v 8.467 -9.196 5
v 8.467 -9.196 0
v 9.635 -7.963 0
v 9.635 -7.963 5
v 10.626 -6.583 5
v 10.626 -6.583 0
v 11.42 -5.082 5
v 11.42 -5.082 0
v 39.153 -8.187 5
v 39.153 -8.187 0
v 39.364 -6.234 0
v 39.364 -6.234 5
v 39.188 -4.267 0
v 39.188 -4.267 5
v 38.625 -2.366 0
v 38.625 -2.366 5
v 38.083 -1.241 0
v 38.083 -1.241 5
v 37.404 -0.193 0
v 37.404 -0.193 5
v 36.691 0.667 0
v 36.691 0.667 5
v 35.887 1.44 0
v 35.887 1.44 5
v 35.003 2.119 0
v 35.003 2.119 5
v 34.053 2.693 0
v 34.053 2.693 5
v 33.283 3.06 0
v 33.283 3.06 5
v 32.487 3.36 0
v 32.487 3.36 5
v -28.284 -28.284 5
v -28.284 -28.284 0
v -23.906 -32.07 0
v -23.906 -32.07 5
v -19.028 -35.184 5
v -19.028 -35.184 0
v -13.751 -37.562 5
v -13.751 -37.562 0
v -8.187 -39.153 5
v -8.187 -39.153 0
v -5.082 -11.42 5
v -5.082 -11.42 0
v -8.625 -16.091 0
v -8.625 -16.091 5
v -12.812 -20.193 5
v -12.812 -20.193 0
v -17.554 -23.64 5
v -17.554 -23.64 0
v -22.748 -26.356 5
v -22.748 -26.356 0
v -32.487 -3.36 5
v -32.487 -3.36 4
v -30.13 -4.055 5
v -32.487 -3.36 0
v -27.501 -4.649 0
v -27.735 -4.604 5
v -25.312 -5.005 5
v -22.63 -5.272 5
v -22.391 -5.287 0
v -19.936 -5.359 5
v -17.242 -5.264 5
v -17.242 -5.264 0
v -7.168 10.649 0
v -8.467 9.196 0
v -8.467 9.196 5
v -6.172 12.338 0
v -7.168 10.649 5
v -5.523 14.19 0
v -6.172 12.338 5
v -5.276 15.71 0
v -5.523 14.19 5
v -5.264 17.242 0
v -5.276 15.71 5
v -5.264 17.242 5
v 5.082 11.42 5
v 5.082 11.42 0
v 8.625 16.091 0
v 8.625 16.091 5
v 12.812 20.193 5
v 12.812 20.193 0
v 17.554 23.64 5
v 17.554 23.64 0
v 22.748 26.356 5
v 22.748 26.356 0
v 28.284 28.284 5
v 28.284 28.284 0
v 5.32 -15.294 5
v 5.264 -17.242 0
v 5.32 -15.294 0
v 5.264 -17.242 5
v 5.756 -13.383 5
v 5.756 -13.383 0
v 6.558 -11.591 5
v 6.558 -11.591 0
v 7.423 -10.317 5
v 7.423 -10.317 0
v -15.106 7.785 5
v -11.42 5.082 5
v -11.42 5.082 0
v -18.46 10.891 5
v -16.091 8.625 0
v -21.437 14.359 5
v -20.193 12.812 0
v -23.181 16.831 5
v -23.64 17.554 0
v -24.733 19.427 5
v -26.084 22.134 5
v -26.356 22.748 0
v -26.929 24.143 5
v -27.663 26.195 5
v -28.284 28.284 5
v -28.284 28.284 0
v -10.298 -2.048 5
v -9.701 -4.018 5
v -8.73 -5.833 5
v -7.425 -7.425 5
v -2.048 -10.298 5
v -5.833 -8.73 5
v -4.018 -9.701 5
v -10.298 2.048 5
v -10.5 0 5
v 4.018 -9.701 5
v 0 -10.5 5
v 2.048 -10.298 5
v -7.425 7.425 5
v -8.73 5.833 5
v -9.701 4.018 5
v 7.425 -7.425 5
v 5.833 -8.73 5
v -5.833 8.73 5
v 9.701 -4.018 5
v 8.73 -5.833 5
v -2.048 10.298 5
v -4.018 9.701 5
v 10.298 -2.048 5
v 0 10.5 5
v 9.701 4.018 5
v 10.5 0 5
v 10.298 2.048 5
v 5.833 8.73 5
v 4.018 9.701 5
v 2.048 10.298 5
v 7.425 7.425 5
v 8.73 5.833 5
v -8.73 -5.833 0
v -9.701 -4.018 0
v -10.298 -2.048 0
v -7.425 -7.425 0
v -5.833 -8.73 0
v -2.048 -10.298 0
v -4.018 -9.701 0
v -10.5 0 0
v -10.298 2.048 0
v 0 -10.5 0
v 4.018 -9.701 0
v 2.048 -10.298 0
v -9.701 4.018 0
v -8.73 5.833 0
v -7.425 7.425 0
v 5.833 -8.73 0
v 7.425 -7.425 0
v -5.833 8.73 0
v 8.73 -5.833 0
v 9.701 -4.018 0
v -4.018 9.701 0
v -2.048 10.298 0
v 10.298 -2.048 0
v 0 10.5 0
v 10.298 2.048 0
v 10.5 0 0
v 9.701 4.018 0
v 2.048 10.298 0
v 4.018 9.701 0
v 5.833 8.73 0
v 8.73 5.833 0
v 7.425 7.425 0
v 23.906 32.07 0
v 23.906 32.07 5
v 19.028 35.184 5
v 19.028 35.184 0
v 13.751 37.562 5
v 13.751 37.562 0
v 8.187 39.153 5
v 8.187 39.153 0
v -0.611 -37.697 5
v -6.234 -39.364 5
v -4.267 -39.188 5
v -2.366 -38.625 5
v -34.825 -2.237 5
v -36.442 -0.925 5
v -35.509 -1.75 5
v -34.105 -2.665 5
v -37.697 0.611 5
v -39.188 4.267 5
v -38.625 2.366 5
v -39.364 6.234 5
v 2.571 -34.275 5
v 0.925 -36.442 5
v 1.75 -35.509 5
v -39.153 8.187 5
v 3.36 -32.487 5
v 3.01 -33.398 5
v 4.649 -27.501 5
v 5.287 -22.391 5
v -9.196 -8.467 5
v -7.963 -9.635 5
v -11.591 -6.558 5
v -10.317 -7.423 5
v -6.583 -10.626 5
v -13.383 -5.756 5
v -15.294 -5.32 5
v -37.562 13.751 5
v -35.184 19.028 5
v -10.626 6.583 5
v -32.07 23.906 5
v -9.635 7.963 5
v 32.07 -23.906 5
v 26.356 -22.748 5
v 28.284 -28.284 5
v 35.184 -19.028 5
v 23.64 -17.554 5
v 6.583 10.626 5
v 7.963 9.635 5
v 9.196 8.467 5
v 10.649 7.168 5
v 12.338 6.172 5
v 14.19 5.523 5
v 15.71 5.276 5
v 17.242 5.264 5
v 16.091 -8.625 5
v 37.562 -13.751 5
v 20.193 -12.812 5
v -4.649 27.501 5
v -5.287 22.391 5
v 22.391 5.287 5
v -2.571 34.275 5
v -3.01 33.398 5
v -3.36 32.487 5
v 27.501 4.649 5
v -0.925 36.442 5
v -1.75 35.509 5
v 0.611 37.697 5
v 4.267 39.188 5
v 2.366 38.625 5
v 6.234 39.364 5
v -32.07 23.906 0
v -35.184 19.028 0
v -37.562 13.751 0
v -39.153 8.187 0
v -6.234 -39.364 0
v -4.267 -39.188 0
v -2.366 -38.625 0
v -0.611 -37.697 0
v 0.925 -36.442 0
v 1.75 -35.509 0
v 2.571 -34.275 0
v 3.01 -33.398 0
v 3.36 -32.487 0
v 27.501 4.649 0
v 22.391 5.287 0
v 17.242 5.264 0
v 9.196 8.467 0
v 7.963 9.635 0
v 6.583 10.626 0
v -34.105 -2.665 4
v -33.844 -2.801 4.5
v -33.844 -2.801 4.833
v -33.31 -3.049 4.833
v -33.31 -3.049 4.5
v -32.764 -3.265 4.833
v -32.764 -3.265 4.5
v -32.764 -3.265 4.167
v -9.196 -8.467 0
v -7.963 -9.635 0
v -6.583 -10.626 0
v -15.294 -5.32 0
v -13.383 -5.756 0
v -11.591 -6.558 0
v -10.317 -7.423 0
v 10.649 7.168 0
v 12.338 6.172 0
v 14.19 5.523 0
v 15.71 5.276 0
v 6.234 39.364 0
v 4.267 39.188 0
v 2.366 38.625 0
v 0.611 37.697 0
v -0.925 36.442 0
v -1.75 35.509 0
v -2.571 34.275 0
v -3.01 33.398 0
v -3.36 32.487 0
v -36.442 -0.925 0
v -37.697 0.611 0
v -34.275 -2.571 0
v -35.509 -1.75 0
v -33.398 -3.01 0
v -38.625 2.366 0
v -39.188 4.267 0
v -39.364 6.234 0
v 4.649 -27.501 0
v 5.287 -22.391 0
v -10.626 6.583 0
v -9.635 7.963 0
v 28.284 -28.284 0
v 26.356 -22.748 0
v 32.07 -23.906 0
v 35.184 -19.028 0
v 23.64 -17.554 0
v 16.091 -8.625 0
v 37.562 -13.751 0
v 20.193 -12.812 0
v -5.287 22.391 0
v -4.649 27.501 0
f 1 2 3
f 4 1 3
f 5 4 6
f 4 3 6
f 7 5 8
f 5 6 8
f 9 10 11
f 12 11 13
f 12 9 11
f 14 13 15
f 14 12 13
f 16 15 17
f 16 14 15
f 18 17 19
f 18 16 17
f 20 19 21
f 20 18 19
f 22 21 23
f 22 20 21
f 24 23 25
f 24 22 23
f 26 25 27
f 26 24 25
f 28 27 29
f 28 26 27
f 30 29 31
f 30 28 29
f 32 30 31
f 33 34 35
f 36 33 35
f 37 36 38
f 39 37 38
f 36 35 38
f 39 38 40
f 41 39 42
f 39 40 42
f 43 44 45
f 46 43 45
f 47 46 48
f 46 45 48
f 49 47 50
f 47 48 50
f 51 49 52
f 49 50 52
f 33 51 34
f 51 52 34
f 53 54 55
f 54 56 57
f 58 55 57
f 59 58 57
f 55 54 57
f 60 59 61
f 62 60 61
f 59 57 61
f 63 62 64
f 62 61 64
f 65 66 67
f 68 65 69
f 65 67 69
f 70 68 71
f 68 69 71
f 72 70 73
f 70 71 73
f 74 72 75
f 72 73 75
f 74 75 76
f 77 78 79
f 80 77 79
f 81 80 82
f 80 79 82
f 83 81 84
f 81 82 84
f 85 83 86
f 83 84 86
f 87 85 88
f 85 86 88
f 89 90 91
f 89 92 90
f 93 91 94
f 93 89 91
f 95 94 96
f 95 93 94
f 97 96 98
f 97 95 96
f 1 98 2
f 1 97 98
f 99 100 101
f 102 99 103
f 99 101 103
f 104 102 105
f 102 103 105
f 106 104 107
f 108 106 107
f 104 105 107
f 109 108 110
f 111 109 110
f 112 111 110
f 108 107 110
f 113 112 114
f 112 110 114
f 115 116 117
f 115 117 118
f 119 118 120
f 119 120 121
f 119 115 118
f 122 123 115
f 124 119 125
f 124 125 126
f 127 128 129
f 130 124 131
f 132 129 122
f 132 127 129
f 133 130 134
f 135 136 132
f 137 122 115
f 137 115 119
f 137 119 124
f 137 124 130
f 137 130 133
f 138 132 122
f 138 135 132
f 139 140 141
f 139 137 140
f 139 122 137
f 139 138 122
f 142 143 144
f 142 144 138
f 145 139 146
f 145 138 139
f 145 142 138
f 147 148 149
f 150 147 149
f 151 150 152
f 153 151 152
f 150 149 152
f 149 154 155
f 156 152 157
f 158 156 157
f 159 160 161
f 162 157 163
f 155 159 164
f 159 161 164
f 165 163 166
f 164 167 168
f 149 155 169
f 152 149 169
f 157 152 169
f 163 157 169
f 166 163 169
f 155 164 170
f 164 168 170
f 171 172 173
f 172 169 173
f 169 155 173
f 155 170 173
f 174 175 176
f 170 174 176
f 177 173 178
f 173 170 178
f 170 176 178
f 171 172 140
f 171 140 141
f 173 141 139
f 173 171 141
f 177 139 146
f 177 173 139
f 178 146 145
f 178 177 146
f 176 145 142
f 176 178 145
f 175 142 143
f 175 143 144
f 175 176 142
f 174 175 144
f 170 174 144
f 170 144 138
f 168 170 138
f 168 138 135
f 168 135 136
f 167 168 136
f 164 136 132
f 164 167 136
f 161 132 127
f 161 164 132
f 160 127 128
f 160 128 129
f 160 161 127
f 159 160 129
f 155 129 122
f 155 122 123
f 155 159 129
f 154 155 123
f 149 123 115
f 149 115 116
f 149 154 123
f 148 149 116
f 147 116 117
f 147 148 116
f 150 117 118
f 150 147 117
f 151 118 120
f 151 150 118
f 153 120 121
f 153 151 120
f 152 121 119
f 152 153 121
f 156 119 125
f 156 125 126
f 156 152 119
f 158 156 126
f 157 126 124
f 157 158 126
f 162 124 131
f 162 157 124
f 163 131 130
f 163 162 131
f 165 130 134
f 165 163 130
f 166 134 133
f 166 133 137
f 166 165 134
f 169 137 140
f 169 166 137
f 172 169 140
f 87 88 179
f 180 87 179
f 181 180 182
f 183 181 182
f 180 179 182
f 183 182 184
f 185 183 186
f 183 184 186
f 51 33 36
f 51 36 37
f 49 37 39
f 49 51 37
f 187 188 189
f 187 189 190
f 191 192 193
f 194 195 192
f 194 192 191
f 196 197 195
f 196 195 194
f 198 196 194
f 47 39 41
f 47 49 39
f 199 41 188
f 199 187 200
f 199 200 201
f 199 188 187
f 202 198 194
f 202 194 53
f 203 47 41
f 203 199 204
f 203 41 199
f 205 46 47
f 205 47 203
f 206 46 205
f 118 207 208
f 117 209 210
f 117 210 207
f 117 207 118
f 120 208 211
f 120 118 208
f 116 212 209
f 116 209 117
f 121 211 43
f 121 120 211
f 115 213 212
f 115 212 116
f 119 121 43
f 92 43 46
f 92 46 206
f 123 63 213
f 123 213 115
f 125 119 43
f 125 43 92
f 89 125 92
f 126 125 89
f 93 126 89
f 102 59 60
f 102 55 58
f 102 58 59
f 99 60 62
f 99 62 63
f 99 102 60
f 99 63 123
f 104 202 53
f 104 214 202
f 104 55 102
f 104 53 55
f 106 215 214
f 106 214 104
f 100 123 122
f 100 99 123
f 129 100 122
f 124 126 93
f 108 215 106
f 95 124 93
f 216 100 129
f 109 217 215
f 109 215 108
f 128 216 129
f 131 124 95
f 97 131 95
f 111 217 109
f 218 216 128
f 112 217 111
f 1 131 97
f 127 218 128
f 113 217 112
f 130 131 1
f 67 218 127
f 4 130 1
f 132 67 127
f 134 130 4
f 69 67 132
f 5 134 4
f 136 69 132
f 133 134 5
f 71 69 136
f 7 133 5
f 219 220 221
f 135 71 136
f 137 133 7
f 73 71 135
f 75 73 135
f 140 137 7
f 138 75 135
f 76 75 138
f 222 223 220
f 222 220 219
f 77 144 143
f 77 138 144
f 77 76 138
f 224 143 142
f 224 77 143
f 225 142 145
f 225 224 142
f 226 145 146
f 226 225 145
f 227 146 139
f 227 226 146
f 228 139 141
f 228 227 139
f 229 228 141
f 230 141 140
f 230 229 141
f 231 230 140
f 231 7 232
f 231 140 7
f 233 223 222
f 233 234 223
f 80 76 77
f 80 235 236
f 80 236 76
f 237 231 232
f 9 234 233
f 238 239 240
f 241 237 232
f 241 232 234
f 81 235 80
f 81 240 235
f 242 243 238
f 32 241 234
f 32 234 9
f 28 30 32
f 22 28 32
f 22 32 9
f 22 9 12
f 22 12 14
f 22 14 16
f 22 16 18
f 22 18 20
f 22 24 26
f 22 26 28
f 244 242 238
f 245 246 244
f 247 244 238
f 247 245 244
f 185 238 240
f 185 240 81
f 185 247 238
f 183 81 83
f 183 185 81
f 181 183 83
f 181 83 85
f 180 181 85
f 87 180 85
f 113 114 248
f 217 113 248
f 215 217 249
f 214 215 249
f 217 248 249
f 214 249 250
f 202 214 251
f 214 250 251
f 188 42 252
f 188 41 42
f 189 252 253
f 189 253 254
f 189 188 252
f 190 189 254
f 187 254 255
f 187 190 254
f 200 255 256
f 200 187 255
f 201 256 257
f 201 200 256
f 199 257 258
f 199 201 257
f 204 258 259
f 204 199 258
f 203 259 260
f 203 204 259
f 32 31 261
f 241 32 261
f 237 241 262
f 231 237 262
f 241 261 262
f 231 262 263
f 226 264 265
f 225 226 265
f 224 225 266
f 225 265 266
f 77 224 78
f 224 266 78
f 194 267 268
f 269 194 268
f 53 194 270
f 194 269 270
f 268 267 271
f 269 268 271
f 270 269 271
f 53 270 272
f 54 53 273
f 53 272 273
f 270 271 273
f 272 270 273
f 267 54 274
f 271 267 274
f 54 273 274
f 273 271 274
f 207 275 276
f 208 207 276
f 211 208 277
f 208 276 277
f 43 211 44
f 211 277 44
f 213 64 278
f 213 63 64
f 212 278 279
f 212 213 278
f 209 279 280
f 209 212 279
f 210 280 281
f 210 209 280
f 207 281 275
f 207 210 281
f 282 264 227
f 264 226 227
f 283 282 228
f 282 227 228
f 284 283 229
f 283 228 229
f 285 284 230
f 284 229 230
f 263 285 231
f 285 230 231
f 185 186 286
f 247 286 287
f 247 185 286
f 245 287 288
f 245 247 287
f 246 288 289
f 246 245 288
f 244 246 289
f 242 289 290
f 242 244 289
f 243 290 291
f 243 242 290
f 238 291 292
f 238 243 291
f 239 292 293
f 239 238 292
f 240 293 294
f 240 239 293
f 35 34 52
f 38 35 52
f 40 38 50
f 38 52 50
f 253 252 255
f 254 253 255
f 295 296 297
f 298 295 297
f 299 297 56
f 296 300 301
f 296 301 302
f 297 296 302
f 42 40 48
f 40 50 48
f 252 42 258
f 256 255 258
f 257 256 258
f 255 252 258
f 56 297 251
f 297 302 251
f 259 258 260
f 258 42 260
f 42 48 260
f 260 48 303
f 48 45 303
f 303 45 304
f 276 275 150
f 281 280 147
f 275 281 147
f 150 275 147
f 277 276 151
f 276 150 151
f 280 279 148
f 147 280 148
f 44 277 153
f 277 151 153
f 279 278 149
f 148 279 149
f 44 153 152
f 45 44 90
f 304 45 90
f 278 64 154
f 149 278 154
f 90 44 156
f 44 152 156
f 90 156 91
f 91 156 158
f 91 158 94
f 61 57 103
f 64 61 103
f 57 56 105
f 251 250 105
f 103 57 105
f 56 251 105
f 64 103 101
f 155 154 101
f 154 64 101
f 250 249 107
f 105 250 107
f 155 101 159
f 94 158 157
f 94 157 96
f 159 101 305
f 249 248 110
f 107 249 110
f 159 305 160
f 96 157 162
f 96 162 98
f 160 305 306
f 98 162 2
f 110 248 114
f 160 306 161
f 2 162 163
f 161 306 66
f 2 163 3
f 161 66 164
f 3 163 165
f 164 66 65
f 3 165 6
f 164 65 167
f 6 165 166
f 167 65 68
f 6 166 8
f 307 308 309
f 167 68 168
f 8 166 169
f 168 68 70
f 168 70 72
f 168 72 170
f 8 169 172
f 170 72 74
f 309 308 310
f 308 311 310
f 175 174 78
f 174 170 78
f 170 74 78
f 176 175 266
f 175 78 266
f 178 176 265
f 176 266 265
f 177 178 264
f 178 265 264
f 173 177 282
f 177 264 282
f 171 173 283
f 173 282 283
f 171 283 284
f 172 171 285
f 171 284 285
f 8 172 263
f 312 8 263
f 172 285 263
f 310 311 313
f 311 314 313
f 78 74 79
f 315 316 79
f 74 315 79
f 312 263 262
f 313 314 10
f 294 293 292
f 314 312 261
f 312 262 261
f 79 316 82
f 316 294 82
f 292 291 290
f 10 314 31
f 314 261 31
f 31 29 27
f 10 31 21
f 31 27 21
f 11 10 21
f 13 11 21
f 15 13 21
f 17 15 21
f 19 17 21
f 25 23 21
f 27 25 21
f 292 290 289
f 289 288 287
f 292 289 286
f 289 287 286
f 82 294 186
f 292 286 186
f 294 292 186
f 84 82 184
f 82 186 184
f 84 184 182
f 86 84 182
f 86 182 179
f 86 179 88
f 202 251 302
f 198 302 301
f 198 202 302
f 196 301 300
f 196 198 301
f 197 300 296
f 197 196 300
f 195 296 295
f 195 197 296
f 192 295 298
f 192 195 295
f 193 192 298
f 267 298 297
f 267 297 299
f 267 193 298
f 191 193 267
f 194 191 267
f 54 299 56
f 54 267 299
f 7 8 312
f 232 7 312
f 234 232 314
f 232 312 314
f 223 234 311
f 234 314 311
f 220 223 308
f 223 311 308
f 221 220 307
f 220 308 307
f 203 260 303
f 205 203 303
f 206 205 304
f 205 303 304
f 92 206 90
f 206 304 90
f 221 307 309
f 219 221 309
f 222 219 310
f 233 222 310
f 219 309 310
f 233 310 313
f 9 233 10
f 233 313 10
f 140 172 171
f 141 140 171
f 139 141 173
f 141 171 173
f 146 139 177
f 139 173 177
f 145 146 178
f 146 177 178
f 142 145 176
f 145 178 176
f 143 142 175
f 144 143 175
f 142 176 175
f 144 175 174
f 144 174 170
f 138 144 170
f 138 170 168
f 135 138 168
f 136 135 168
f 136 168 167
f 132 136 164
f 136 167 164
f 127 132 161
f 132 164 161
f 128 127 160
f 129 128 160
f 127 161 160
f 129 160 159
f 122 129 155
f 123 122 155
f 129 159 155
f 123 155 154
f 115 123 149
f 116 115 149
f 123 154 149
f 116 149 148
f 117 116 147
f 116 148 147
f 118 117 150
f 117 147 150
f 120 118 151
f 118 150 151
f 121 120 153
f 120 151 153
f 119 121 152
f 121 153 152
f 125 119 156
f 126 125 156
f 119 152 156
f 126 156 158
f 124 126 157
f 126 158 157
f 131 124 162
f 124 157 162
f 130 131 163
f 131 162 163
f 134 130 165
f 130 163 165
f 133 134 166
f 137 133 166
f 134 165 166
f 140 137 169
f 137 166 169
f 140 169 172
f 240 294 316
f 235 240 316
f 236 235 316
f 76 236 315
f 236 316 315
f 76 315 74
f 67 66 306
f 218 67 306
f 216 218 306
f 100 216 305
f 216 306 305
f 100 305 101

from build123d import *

# Parameters (mm, degrees)
F0_R     = 10.5
F1_DEPTH = 5
F2_R     = 10
F4_DEPTH = 1
F5_DEPTH = 1
F6_DEPTH = 5
F7_R     = 10


with BuildPart() as f1:
    # F0 (on Top) → F1 (new body)
    with BuildSketch(Plane.XY):
        with BuildLine():
            ThreePointArc((-11.6689185103, -4.481778754), (-12.4957774549, 0.3248781274), (-11.4202675565, 5.082075259))
            ThreePointArc((-11.4202675565, 5.082075259), (-22.0035263766, 15.1195796357), (-28.2842712475, 28.2842712475))
            ThreePointArc((-28.2842712475, 28.2842712475), (-36.9551813005, 15.3073372946), (-40, 0))
            ThreePointArc((-40, 0), (-26.25, -4.8676854218), (-11.6689185103, -4.481778754))
        make_face()
        with BuildLine():
            ThreePointArc((5.082075259, 11.4202675565), (15.1195796357, 22.0035263766), (28.2842712475, 28.2842712475))
            ThreePointArc((28.2842712475, 28.2842712475), (15.3073372946, 36.9551813005), (0, 40))
            ThreePointArc((0, 40), (-4.8676854218, 26.25), (-4.481778754, 11.6689185103))
            ThreePointArc((-4.481778754, 11.6689185103), (0.3248781274, 12.4957774549), (5.082075259, 11.4202675565))
        make_face()
        with BuildLine():
            ThreePointArc((11.6689185103, 4.481778754), (9.0655725015, 8.6061254476), (5.082075259, 11.4202675565))
            ThreePointArc((5.082075259, 11.4202675565), (0.3248781274, 12.4957774549), (-4.481778754, 11.6689185103))
            ThreePointArc((-4.481778754, 11.6689185103), (-8.6061254476, 9.0655725015), (-11.4202675565, 5.082075259))
            ThreePointArc((-11.4202675565, 5.082075259), (-12.4957774549, 0.3248781274), (-11.6689185103, -4.481778754))
            ThreePointArc((-11.6689185103, -4.481778754), (-9.0655725015, -8.6061254476), (-5.082075259, -11.4202675565))
            ThreePointArc((-5.082075259, -11.4202675565), (-0.3248781274, -12.4957774549), (4.481778754, -11.6689185103))
            ThreePointArc((4.481778754, -11.6689185103), (8.6061254476, -9.0655725015), (11.4202675565, -5.082075259))
            ThreePointArc((11.4202675565, -5.082075259), (12.2270876429, -2.597754371), (12.5, 0))
            ThreePointArc((12.5, 0), (12.2904735747, 2.2790917732), (11.6689185103, 4.481778754))
        make_face()
        Circle(F0_R, mode=Mode.SUBTRACT)
        with BuildLine():
            ThreePointArc((40, 0), (26.25, 4.8676854218), (11.6689185103, 4.481778754))
            ThreePointArc((11.6689185103, 4.481778754), (12.2904735747, 2.2790917732), (12.5, 0))
            ThreePointArc((12.5, 0), (12.2270876429, -2.597754371), (11.4202675565, -5.082075259))
            ThreePointArc((11.4202675565, -5.082075259), (22.0035263766, -15.1195796357), (28.2842712475, -28.2842712475))
            ThreePointArc((28.2842712475, -28.2842712475), (36.9551813005, -15.3073372946), (40, 0))
        make_face()
        with BuildLine():
            ThreePointArc((4.481778754, -11.6689185103), (-0.3248781274, -12.4957774549), (-5.082075259, -11.4202675565))
            ThreePointArc((-5.082075259, -11.4202675565), (-15.1195796357, -22.0035263766), (-28.2842712475, -28.2842712475))
            ThreePointArc((-28.2842712475, -28.2842712475), (-15.3073372946, -36.9551813005), (0, -40))
            ThreePointArc((0, -40), (4.8676854218, -26.25), (4.481778754, -11.6689185103))
        make_face()
    extrude(amount=F1_DEPTH)

    # F2
    f2_edges = [f1.edges().sort_by_distance(p)[0] for p in [
        (-40, 0, 2.5),
        (0, -40, 2.5),
        (40, 0, 2.5),
        (0, 40, 2.5),
    ]]
    fillet(f2_edges, radius=F2_R)

    # F3 (on face) → F4 (cut)
    with BuildSketch(Plane.XY.offset(5)):
        with BuildLine():
            ThreePointArc((-25.3116756684, -5.0047415232), (-25.3001707478, 5.0625806649), (-21.4369441775, 14.3591708391))
            ThreePointArc((-21.4369441775, 14.3591708391), (-23.9812309448, 18.1144371651), (-26.0839950043, 22.1336166391))
            ThreePointArc((-26.0839950043, 22.1336166391), (-32.548865417, 10.5282069215), (-34.1052807152, -2.6648842851))
            add(Edge.make_bspline(
                [(-34.1052807152, -2.6648842851), (-33.8455808028, -2.8046985599), (-33.5812223291, -2.9351651438), (-33.3126639182, -3.0560868057), (-33.040376273, -3.1672997314), (-32.7648420347, -3.2686740675), (-32.4865556414, -3.3601144662)],
                knots=[0.8783374065, 0.8783374065, 0.8783374065, 0.8783374065, 0.8783374065, 0.8783374065, 0.8783374065, 1, 1, 1, 1, 1, 1, 1], degree=6))
            ThreePointArc((-32.4865556414, -3.3601144662), (-28.9370274128, -4.347822521), (-25.3116756684, -5.0047415232))
        make_face()
    extrude(amount=-F4_DEPTH, mode=Mode.SUBTRACT)

    # F5 (add, through all): faces of the model
    f5_faces = [f1.faces().sort_by_distance(p)[0] for p in [
        (-28.4327754327, 7.5387813356, 4),
        (-28.4327754327, 7.5387813356, 4),
        (-28.4327754327, 7.5387813356, 4),
        (-28.4327754327, 7.5387813356, 4),
    ]]
    extrude(f5_faces, amount=F5_DEPTH)

    # F7
    f7_edges = [f1.edges().sort_by_distance(p)[0] for p in [
        (-11.668919, -4.481779, 2.5),
        (4.481779, -11.668919, 2.5),
        (11.668919, 4.481779, 2.5),
        (-4.481779, 11.668919, 2.5),
    ]]
    fillet(f7_edges, radius=F7_R)


with BuildPart() as f6:
    # F0 (on Top) → F6 (new body, through all)
    with BuildSketch(Plane.XY):
        Circle(F0_R)
    extrude(amount=F6_DEPTH)


solid = Compound([f1.part, f6.part])
